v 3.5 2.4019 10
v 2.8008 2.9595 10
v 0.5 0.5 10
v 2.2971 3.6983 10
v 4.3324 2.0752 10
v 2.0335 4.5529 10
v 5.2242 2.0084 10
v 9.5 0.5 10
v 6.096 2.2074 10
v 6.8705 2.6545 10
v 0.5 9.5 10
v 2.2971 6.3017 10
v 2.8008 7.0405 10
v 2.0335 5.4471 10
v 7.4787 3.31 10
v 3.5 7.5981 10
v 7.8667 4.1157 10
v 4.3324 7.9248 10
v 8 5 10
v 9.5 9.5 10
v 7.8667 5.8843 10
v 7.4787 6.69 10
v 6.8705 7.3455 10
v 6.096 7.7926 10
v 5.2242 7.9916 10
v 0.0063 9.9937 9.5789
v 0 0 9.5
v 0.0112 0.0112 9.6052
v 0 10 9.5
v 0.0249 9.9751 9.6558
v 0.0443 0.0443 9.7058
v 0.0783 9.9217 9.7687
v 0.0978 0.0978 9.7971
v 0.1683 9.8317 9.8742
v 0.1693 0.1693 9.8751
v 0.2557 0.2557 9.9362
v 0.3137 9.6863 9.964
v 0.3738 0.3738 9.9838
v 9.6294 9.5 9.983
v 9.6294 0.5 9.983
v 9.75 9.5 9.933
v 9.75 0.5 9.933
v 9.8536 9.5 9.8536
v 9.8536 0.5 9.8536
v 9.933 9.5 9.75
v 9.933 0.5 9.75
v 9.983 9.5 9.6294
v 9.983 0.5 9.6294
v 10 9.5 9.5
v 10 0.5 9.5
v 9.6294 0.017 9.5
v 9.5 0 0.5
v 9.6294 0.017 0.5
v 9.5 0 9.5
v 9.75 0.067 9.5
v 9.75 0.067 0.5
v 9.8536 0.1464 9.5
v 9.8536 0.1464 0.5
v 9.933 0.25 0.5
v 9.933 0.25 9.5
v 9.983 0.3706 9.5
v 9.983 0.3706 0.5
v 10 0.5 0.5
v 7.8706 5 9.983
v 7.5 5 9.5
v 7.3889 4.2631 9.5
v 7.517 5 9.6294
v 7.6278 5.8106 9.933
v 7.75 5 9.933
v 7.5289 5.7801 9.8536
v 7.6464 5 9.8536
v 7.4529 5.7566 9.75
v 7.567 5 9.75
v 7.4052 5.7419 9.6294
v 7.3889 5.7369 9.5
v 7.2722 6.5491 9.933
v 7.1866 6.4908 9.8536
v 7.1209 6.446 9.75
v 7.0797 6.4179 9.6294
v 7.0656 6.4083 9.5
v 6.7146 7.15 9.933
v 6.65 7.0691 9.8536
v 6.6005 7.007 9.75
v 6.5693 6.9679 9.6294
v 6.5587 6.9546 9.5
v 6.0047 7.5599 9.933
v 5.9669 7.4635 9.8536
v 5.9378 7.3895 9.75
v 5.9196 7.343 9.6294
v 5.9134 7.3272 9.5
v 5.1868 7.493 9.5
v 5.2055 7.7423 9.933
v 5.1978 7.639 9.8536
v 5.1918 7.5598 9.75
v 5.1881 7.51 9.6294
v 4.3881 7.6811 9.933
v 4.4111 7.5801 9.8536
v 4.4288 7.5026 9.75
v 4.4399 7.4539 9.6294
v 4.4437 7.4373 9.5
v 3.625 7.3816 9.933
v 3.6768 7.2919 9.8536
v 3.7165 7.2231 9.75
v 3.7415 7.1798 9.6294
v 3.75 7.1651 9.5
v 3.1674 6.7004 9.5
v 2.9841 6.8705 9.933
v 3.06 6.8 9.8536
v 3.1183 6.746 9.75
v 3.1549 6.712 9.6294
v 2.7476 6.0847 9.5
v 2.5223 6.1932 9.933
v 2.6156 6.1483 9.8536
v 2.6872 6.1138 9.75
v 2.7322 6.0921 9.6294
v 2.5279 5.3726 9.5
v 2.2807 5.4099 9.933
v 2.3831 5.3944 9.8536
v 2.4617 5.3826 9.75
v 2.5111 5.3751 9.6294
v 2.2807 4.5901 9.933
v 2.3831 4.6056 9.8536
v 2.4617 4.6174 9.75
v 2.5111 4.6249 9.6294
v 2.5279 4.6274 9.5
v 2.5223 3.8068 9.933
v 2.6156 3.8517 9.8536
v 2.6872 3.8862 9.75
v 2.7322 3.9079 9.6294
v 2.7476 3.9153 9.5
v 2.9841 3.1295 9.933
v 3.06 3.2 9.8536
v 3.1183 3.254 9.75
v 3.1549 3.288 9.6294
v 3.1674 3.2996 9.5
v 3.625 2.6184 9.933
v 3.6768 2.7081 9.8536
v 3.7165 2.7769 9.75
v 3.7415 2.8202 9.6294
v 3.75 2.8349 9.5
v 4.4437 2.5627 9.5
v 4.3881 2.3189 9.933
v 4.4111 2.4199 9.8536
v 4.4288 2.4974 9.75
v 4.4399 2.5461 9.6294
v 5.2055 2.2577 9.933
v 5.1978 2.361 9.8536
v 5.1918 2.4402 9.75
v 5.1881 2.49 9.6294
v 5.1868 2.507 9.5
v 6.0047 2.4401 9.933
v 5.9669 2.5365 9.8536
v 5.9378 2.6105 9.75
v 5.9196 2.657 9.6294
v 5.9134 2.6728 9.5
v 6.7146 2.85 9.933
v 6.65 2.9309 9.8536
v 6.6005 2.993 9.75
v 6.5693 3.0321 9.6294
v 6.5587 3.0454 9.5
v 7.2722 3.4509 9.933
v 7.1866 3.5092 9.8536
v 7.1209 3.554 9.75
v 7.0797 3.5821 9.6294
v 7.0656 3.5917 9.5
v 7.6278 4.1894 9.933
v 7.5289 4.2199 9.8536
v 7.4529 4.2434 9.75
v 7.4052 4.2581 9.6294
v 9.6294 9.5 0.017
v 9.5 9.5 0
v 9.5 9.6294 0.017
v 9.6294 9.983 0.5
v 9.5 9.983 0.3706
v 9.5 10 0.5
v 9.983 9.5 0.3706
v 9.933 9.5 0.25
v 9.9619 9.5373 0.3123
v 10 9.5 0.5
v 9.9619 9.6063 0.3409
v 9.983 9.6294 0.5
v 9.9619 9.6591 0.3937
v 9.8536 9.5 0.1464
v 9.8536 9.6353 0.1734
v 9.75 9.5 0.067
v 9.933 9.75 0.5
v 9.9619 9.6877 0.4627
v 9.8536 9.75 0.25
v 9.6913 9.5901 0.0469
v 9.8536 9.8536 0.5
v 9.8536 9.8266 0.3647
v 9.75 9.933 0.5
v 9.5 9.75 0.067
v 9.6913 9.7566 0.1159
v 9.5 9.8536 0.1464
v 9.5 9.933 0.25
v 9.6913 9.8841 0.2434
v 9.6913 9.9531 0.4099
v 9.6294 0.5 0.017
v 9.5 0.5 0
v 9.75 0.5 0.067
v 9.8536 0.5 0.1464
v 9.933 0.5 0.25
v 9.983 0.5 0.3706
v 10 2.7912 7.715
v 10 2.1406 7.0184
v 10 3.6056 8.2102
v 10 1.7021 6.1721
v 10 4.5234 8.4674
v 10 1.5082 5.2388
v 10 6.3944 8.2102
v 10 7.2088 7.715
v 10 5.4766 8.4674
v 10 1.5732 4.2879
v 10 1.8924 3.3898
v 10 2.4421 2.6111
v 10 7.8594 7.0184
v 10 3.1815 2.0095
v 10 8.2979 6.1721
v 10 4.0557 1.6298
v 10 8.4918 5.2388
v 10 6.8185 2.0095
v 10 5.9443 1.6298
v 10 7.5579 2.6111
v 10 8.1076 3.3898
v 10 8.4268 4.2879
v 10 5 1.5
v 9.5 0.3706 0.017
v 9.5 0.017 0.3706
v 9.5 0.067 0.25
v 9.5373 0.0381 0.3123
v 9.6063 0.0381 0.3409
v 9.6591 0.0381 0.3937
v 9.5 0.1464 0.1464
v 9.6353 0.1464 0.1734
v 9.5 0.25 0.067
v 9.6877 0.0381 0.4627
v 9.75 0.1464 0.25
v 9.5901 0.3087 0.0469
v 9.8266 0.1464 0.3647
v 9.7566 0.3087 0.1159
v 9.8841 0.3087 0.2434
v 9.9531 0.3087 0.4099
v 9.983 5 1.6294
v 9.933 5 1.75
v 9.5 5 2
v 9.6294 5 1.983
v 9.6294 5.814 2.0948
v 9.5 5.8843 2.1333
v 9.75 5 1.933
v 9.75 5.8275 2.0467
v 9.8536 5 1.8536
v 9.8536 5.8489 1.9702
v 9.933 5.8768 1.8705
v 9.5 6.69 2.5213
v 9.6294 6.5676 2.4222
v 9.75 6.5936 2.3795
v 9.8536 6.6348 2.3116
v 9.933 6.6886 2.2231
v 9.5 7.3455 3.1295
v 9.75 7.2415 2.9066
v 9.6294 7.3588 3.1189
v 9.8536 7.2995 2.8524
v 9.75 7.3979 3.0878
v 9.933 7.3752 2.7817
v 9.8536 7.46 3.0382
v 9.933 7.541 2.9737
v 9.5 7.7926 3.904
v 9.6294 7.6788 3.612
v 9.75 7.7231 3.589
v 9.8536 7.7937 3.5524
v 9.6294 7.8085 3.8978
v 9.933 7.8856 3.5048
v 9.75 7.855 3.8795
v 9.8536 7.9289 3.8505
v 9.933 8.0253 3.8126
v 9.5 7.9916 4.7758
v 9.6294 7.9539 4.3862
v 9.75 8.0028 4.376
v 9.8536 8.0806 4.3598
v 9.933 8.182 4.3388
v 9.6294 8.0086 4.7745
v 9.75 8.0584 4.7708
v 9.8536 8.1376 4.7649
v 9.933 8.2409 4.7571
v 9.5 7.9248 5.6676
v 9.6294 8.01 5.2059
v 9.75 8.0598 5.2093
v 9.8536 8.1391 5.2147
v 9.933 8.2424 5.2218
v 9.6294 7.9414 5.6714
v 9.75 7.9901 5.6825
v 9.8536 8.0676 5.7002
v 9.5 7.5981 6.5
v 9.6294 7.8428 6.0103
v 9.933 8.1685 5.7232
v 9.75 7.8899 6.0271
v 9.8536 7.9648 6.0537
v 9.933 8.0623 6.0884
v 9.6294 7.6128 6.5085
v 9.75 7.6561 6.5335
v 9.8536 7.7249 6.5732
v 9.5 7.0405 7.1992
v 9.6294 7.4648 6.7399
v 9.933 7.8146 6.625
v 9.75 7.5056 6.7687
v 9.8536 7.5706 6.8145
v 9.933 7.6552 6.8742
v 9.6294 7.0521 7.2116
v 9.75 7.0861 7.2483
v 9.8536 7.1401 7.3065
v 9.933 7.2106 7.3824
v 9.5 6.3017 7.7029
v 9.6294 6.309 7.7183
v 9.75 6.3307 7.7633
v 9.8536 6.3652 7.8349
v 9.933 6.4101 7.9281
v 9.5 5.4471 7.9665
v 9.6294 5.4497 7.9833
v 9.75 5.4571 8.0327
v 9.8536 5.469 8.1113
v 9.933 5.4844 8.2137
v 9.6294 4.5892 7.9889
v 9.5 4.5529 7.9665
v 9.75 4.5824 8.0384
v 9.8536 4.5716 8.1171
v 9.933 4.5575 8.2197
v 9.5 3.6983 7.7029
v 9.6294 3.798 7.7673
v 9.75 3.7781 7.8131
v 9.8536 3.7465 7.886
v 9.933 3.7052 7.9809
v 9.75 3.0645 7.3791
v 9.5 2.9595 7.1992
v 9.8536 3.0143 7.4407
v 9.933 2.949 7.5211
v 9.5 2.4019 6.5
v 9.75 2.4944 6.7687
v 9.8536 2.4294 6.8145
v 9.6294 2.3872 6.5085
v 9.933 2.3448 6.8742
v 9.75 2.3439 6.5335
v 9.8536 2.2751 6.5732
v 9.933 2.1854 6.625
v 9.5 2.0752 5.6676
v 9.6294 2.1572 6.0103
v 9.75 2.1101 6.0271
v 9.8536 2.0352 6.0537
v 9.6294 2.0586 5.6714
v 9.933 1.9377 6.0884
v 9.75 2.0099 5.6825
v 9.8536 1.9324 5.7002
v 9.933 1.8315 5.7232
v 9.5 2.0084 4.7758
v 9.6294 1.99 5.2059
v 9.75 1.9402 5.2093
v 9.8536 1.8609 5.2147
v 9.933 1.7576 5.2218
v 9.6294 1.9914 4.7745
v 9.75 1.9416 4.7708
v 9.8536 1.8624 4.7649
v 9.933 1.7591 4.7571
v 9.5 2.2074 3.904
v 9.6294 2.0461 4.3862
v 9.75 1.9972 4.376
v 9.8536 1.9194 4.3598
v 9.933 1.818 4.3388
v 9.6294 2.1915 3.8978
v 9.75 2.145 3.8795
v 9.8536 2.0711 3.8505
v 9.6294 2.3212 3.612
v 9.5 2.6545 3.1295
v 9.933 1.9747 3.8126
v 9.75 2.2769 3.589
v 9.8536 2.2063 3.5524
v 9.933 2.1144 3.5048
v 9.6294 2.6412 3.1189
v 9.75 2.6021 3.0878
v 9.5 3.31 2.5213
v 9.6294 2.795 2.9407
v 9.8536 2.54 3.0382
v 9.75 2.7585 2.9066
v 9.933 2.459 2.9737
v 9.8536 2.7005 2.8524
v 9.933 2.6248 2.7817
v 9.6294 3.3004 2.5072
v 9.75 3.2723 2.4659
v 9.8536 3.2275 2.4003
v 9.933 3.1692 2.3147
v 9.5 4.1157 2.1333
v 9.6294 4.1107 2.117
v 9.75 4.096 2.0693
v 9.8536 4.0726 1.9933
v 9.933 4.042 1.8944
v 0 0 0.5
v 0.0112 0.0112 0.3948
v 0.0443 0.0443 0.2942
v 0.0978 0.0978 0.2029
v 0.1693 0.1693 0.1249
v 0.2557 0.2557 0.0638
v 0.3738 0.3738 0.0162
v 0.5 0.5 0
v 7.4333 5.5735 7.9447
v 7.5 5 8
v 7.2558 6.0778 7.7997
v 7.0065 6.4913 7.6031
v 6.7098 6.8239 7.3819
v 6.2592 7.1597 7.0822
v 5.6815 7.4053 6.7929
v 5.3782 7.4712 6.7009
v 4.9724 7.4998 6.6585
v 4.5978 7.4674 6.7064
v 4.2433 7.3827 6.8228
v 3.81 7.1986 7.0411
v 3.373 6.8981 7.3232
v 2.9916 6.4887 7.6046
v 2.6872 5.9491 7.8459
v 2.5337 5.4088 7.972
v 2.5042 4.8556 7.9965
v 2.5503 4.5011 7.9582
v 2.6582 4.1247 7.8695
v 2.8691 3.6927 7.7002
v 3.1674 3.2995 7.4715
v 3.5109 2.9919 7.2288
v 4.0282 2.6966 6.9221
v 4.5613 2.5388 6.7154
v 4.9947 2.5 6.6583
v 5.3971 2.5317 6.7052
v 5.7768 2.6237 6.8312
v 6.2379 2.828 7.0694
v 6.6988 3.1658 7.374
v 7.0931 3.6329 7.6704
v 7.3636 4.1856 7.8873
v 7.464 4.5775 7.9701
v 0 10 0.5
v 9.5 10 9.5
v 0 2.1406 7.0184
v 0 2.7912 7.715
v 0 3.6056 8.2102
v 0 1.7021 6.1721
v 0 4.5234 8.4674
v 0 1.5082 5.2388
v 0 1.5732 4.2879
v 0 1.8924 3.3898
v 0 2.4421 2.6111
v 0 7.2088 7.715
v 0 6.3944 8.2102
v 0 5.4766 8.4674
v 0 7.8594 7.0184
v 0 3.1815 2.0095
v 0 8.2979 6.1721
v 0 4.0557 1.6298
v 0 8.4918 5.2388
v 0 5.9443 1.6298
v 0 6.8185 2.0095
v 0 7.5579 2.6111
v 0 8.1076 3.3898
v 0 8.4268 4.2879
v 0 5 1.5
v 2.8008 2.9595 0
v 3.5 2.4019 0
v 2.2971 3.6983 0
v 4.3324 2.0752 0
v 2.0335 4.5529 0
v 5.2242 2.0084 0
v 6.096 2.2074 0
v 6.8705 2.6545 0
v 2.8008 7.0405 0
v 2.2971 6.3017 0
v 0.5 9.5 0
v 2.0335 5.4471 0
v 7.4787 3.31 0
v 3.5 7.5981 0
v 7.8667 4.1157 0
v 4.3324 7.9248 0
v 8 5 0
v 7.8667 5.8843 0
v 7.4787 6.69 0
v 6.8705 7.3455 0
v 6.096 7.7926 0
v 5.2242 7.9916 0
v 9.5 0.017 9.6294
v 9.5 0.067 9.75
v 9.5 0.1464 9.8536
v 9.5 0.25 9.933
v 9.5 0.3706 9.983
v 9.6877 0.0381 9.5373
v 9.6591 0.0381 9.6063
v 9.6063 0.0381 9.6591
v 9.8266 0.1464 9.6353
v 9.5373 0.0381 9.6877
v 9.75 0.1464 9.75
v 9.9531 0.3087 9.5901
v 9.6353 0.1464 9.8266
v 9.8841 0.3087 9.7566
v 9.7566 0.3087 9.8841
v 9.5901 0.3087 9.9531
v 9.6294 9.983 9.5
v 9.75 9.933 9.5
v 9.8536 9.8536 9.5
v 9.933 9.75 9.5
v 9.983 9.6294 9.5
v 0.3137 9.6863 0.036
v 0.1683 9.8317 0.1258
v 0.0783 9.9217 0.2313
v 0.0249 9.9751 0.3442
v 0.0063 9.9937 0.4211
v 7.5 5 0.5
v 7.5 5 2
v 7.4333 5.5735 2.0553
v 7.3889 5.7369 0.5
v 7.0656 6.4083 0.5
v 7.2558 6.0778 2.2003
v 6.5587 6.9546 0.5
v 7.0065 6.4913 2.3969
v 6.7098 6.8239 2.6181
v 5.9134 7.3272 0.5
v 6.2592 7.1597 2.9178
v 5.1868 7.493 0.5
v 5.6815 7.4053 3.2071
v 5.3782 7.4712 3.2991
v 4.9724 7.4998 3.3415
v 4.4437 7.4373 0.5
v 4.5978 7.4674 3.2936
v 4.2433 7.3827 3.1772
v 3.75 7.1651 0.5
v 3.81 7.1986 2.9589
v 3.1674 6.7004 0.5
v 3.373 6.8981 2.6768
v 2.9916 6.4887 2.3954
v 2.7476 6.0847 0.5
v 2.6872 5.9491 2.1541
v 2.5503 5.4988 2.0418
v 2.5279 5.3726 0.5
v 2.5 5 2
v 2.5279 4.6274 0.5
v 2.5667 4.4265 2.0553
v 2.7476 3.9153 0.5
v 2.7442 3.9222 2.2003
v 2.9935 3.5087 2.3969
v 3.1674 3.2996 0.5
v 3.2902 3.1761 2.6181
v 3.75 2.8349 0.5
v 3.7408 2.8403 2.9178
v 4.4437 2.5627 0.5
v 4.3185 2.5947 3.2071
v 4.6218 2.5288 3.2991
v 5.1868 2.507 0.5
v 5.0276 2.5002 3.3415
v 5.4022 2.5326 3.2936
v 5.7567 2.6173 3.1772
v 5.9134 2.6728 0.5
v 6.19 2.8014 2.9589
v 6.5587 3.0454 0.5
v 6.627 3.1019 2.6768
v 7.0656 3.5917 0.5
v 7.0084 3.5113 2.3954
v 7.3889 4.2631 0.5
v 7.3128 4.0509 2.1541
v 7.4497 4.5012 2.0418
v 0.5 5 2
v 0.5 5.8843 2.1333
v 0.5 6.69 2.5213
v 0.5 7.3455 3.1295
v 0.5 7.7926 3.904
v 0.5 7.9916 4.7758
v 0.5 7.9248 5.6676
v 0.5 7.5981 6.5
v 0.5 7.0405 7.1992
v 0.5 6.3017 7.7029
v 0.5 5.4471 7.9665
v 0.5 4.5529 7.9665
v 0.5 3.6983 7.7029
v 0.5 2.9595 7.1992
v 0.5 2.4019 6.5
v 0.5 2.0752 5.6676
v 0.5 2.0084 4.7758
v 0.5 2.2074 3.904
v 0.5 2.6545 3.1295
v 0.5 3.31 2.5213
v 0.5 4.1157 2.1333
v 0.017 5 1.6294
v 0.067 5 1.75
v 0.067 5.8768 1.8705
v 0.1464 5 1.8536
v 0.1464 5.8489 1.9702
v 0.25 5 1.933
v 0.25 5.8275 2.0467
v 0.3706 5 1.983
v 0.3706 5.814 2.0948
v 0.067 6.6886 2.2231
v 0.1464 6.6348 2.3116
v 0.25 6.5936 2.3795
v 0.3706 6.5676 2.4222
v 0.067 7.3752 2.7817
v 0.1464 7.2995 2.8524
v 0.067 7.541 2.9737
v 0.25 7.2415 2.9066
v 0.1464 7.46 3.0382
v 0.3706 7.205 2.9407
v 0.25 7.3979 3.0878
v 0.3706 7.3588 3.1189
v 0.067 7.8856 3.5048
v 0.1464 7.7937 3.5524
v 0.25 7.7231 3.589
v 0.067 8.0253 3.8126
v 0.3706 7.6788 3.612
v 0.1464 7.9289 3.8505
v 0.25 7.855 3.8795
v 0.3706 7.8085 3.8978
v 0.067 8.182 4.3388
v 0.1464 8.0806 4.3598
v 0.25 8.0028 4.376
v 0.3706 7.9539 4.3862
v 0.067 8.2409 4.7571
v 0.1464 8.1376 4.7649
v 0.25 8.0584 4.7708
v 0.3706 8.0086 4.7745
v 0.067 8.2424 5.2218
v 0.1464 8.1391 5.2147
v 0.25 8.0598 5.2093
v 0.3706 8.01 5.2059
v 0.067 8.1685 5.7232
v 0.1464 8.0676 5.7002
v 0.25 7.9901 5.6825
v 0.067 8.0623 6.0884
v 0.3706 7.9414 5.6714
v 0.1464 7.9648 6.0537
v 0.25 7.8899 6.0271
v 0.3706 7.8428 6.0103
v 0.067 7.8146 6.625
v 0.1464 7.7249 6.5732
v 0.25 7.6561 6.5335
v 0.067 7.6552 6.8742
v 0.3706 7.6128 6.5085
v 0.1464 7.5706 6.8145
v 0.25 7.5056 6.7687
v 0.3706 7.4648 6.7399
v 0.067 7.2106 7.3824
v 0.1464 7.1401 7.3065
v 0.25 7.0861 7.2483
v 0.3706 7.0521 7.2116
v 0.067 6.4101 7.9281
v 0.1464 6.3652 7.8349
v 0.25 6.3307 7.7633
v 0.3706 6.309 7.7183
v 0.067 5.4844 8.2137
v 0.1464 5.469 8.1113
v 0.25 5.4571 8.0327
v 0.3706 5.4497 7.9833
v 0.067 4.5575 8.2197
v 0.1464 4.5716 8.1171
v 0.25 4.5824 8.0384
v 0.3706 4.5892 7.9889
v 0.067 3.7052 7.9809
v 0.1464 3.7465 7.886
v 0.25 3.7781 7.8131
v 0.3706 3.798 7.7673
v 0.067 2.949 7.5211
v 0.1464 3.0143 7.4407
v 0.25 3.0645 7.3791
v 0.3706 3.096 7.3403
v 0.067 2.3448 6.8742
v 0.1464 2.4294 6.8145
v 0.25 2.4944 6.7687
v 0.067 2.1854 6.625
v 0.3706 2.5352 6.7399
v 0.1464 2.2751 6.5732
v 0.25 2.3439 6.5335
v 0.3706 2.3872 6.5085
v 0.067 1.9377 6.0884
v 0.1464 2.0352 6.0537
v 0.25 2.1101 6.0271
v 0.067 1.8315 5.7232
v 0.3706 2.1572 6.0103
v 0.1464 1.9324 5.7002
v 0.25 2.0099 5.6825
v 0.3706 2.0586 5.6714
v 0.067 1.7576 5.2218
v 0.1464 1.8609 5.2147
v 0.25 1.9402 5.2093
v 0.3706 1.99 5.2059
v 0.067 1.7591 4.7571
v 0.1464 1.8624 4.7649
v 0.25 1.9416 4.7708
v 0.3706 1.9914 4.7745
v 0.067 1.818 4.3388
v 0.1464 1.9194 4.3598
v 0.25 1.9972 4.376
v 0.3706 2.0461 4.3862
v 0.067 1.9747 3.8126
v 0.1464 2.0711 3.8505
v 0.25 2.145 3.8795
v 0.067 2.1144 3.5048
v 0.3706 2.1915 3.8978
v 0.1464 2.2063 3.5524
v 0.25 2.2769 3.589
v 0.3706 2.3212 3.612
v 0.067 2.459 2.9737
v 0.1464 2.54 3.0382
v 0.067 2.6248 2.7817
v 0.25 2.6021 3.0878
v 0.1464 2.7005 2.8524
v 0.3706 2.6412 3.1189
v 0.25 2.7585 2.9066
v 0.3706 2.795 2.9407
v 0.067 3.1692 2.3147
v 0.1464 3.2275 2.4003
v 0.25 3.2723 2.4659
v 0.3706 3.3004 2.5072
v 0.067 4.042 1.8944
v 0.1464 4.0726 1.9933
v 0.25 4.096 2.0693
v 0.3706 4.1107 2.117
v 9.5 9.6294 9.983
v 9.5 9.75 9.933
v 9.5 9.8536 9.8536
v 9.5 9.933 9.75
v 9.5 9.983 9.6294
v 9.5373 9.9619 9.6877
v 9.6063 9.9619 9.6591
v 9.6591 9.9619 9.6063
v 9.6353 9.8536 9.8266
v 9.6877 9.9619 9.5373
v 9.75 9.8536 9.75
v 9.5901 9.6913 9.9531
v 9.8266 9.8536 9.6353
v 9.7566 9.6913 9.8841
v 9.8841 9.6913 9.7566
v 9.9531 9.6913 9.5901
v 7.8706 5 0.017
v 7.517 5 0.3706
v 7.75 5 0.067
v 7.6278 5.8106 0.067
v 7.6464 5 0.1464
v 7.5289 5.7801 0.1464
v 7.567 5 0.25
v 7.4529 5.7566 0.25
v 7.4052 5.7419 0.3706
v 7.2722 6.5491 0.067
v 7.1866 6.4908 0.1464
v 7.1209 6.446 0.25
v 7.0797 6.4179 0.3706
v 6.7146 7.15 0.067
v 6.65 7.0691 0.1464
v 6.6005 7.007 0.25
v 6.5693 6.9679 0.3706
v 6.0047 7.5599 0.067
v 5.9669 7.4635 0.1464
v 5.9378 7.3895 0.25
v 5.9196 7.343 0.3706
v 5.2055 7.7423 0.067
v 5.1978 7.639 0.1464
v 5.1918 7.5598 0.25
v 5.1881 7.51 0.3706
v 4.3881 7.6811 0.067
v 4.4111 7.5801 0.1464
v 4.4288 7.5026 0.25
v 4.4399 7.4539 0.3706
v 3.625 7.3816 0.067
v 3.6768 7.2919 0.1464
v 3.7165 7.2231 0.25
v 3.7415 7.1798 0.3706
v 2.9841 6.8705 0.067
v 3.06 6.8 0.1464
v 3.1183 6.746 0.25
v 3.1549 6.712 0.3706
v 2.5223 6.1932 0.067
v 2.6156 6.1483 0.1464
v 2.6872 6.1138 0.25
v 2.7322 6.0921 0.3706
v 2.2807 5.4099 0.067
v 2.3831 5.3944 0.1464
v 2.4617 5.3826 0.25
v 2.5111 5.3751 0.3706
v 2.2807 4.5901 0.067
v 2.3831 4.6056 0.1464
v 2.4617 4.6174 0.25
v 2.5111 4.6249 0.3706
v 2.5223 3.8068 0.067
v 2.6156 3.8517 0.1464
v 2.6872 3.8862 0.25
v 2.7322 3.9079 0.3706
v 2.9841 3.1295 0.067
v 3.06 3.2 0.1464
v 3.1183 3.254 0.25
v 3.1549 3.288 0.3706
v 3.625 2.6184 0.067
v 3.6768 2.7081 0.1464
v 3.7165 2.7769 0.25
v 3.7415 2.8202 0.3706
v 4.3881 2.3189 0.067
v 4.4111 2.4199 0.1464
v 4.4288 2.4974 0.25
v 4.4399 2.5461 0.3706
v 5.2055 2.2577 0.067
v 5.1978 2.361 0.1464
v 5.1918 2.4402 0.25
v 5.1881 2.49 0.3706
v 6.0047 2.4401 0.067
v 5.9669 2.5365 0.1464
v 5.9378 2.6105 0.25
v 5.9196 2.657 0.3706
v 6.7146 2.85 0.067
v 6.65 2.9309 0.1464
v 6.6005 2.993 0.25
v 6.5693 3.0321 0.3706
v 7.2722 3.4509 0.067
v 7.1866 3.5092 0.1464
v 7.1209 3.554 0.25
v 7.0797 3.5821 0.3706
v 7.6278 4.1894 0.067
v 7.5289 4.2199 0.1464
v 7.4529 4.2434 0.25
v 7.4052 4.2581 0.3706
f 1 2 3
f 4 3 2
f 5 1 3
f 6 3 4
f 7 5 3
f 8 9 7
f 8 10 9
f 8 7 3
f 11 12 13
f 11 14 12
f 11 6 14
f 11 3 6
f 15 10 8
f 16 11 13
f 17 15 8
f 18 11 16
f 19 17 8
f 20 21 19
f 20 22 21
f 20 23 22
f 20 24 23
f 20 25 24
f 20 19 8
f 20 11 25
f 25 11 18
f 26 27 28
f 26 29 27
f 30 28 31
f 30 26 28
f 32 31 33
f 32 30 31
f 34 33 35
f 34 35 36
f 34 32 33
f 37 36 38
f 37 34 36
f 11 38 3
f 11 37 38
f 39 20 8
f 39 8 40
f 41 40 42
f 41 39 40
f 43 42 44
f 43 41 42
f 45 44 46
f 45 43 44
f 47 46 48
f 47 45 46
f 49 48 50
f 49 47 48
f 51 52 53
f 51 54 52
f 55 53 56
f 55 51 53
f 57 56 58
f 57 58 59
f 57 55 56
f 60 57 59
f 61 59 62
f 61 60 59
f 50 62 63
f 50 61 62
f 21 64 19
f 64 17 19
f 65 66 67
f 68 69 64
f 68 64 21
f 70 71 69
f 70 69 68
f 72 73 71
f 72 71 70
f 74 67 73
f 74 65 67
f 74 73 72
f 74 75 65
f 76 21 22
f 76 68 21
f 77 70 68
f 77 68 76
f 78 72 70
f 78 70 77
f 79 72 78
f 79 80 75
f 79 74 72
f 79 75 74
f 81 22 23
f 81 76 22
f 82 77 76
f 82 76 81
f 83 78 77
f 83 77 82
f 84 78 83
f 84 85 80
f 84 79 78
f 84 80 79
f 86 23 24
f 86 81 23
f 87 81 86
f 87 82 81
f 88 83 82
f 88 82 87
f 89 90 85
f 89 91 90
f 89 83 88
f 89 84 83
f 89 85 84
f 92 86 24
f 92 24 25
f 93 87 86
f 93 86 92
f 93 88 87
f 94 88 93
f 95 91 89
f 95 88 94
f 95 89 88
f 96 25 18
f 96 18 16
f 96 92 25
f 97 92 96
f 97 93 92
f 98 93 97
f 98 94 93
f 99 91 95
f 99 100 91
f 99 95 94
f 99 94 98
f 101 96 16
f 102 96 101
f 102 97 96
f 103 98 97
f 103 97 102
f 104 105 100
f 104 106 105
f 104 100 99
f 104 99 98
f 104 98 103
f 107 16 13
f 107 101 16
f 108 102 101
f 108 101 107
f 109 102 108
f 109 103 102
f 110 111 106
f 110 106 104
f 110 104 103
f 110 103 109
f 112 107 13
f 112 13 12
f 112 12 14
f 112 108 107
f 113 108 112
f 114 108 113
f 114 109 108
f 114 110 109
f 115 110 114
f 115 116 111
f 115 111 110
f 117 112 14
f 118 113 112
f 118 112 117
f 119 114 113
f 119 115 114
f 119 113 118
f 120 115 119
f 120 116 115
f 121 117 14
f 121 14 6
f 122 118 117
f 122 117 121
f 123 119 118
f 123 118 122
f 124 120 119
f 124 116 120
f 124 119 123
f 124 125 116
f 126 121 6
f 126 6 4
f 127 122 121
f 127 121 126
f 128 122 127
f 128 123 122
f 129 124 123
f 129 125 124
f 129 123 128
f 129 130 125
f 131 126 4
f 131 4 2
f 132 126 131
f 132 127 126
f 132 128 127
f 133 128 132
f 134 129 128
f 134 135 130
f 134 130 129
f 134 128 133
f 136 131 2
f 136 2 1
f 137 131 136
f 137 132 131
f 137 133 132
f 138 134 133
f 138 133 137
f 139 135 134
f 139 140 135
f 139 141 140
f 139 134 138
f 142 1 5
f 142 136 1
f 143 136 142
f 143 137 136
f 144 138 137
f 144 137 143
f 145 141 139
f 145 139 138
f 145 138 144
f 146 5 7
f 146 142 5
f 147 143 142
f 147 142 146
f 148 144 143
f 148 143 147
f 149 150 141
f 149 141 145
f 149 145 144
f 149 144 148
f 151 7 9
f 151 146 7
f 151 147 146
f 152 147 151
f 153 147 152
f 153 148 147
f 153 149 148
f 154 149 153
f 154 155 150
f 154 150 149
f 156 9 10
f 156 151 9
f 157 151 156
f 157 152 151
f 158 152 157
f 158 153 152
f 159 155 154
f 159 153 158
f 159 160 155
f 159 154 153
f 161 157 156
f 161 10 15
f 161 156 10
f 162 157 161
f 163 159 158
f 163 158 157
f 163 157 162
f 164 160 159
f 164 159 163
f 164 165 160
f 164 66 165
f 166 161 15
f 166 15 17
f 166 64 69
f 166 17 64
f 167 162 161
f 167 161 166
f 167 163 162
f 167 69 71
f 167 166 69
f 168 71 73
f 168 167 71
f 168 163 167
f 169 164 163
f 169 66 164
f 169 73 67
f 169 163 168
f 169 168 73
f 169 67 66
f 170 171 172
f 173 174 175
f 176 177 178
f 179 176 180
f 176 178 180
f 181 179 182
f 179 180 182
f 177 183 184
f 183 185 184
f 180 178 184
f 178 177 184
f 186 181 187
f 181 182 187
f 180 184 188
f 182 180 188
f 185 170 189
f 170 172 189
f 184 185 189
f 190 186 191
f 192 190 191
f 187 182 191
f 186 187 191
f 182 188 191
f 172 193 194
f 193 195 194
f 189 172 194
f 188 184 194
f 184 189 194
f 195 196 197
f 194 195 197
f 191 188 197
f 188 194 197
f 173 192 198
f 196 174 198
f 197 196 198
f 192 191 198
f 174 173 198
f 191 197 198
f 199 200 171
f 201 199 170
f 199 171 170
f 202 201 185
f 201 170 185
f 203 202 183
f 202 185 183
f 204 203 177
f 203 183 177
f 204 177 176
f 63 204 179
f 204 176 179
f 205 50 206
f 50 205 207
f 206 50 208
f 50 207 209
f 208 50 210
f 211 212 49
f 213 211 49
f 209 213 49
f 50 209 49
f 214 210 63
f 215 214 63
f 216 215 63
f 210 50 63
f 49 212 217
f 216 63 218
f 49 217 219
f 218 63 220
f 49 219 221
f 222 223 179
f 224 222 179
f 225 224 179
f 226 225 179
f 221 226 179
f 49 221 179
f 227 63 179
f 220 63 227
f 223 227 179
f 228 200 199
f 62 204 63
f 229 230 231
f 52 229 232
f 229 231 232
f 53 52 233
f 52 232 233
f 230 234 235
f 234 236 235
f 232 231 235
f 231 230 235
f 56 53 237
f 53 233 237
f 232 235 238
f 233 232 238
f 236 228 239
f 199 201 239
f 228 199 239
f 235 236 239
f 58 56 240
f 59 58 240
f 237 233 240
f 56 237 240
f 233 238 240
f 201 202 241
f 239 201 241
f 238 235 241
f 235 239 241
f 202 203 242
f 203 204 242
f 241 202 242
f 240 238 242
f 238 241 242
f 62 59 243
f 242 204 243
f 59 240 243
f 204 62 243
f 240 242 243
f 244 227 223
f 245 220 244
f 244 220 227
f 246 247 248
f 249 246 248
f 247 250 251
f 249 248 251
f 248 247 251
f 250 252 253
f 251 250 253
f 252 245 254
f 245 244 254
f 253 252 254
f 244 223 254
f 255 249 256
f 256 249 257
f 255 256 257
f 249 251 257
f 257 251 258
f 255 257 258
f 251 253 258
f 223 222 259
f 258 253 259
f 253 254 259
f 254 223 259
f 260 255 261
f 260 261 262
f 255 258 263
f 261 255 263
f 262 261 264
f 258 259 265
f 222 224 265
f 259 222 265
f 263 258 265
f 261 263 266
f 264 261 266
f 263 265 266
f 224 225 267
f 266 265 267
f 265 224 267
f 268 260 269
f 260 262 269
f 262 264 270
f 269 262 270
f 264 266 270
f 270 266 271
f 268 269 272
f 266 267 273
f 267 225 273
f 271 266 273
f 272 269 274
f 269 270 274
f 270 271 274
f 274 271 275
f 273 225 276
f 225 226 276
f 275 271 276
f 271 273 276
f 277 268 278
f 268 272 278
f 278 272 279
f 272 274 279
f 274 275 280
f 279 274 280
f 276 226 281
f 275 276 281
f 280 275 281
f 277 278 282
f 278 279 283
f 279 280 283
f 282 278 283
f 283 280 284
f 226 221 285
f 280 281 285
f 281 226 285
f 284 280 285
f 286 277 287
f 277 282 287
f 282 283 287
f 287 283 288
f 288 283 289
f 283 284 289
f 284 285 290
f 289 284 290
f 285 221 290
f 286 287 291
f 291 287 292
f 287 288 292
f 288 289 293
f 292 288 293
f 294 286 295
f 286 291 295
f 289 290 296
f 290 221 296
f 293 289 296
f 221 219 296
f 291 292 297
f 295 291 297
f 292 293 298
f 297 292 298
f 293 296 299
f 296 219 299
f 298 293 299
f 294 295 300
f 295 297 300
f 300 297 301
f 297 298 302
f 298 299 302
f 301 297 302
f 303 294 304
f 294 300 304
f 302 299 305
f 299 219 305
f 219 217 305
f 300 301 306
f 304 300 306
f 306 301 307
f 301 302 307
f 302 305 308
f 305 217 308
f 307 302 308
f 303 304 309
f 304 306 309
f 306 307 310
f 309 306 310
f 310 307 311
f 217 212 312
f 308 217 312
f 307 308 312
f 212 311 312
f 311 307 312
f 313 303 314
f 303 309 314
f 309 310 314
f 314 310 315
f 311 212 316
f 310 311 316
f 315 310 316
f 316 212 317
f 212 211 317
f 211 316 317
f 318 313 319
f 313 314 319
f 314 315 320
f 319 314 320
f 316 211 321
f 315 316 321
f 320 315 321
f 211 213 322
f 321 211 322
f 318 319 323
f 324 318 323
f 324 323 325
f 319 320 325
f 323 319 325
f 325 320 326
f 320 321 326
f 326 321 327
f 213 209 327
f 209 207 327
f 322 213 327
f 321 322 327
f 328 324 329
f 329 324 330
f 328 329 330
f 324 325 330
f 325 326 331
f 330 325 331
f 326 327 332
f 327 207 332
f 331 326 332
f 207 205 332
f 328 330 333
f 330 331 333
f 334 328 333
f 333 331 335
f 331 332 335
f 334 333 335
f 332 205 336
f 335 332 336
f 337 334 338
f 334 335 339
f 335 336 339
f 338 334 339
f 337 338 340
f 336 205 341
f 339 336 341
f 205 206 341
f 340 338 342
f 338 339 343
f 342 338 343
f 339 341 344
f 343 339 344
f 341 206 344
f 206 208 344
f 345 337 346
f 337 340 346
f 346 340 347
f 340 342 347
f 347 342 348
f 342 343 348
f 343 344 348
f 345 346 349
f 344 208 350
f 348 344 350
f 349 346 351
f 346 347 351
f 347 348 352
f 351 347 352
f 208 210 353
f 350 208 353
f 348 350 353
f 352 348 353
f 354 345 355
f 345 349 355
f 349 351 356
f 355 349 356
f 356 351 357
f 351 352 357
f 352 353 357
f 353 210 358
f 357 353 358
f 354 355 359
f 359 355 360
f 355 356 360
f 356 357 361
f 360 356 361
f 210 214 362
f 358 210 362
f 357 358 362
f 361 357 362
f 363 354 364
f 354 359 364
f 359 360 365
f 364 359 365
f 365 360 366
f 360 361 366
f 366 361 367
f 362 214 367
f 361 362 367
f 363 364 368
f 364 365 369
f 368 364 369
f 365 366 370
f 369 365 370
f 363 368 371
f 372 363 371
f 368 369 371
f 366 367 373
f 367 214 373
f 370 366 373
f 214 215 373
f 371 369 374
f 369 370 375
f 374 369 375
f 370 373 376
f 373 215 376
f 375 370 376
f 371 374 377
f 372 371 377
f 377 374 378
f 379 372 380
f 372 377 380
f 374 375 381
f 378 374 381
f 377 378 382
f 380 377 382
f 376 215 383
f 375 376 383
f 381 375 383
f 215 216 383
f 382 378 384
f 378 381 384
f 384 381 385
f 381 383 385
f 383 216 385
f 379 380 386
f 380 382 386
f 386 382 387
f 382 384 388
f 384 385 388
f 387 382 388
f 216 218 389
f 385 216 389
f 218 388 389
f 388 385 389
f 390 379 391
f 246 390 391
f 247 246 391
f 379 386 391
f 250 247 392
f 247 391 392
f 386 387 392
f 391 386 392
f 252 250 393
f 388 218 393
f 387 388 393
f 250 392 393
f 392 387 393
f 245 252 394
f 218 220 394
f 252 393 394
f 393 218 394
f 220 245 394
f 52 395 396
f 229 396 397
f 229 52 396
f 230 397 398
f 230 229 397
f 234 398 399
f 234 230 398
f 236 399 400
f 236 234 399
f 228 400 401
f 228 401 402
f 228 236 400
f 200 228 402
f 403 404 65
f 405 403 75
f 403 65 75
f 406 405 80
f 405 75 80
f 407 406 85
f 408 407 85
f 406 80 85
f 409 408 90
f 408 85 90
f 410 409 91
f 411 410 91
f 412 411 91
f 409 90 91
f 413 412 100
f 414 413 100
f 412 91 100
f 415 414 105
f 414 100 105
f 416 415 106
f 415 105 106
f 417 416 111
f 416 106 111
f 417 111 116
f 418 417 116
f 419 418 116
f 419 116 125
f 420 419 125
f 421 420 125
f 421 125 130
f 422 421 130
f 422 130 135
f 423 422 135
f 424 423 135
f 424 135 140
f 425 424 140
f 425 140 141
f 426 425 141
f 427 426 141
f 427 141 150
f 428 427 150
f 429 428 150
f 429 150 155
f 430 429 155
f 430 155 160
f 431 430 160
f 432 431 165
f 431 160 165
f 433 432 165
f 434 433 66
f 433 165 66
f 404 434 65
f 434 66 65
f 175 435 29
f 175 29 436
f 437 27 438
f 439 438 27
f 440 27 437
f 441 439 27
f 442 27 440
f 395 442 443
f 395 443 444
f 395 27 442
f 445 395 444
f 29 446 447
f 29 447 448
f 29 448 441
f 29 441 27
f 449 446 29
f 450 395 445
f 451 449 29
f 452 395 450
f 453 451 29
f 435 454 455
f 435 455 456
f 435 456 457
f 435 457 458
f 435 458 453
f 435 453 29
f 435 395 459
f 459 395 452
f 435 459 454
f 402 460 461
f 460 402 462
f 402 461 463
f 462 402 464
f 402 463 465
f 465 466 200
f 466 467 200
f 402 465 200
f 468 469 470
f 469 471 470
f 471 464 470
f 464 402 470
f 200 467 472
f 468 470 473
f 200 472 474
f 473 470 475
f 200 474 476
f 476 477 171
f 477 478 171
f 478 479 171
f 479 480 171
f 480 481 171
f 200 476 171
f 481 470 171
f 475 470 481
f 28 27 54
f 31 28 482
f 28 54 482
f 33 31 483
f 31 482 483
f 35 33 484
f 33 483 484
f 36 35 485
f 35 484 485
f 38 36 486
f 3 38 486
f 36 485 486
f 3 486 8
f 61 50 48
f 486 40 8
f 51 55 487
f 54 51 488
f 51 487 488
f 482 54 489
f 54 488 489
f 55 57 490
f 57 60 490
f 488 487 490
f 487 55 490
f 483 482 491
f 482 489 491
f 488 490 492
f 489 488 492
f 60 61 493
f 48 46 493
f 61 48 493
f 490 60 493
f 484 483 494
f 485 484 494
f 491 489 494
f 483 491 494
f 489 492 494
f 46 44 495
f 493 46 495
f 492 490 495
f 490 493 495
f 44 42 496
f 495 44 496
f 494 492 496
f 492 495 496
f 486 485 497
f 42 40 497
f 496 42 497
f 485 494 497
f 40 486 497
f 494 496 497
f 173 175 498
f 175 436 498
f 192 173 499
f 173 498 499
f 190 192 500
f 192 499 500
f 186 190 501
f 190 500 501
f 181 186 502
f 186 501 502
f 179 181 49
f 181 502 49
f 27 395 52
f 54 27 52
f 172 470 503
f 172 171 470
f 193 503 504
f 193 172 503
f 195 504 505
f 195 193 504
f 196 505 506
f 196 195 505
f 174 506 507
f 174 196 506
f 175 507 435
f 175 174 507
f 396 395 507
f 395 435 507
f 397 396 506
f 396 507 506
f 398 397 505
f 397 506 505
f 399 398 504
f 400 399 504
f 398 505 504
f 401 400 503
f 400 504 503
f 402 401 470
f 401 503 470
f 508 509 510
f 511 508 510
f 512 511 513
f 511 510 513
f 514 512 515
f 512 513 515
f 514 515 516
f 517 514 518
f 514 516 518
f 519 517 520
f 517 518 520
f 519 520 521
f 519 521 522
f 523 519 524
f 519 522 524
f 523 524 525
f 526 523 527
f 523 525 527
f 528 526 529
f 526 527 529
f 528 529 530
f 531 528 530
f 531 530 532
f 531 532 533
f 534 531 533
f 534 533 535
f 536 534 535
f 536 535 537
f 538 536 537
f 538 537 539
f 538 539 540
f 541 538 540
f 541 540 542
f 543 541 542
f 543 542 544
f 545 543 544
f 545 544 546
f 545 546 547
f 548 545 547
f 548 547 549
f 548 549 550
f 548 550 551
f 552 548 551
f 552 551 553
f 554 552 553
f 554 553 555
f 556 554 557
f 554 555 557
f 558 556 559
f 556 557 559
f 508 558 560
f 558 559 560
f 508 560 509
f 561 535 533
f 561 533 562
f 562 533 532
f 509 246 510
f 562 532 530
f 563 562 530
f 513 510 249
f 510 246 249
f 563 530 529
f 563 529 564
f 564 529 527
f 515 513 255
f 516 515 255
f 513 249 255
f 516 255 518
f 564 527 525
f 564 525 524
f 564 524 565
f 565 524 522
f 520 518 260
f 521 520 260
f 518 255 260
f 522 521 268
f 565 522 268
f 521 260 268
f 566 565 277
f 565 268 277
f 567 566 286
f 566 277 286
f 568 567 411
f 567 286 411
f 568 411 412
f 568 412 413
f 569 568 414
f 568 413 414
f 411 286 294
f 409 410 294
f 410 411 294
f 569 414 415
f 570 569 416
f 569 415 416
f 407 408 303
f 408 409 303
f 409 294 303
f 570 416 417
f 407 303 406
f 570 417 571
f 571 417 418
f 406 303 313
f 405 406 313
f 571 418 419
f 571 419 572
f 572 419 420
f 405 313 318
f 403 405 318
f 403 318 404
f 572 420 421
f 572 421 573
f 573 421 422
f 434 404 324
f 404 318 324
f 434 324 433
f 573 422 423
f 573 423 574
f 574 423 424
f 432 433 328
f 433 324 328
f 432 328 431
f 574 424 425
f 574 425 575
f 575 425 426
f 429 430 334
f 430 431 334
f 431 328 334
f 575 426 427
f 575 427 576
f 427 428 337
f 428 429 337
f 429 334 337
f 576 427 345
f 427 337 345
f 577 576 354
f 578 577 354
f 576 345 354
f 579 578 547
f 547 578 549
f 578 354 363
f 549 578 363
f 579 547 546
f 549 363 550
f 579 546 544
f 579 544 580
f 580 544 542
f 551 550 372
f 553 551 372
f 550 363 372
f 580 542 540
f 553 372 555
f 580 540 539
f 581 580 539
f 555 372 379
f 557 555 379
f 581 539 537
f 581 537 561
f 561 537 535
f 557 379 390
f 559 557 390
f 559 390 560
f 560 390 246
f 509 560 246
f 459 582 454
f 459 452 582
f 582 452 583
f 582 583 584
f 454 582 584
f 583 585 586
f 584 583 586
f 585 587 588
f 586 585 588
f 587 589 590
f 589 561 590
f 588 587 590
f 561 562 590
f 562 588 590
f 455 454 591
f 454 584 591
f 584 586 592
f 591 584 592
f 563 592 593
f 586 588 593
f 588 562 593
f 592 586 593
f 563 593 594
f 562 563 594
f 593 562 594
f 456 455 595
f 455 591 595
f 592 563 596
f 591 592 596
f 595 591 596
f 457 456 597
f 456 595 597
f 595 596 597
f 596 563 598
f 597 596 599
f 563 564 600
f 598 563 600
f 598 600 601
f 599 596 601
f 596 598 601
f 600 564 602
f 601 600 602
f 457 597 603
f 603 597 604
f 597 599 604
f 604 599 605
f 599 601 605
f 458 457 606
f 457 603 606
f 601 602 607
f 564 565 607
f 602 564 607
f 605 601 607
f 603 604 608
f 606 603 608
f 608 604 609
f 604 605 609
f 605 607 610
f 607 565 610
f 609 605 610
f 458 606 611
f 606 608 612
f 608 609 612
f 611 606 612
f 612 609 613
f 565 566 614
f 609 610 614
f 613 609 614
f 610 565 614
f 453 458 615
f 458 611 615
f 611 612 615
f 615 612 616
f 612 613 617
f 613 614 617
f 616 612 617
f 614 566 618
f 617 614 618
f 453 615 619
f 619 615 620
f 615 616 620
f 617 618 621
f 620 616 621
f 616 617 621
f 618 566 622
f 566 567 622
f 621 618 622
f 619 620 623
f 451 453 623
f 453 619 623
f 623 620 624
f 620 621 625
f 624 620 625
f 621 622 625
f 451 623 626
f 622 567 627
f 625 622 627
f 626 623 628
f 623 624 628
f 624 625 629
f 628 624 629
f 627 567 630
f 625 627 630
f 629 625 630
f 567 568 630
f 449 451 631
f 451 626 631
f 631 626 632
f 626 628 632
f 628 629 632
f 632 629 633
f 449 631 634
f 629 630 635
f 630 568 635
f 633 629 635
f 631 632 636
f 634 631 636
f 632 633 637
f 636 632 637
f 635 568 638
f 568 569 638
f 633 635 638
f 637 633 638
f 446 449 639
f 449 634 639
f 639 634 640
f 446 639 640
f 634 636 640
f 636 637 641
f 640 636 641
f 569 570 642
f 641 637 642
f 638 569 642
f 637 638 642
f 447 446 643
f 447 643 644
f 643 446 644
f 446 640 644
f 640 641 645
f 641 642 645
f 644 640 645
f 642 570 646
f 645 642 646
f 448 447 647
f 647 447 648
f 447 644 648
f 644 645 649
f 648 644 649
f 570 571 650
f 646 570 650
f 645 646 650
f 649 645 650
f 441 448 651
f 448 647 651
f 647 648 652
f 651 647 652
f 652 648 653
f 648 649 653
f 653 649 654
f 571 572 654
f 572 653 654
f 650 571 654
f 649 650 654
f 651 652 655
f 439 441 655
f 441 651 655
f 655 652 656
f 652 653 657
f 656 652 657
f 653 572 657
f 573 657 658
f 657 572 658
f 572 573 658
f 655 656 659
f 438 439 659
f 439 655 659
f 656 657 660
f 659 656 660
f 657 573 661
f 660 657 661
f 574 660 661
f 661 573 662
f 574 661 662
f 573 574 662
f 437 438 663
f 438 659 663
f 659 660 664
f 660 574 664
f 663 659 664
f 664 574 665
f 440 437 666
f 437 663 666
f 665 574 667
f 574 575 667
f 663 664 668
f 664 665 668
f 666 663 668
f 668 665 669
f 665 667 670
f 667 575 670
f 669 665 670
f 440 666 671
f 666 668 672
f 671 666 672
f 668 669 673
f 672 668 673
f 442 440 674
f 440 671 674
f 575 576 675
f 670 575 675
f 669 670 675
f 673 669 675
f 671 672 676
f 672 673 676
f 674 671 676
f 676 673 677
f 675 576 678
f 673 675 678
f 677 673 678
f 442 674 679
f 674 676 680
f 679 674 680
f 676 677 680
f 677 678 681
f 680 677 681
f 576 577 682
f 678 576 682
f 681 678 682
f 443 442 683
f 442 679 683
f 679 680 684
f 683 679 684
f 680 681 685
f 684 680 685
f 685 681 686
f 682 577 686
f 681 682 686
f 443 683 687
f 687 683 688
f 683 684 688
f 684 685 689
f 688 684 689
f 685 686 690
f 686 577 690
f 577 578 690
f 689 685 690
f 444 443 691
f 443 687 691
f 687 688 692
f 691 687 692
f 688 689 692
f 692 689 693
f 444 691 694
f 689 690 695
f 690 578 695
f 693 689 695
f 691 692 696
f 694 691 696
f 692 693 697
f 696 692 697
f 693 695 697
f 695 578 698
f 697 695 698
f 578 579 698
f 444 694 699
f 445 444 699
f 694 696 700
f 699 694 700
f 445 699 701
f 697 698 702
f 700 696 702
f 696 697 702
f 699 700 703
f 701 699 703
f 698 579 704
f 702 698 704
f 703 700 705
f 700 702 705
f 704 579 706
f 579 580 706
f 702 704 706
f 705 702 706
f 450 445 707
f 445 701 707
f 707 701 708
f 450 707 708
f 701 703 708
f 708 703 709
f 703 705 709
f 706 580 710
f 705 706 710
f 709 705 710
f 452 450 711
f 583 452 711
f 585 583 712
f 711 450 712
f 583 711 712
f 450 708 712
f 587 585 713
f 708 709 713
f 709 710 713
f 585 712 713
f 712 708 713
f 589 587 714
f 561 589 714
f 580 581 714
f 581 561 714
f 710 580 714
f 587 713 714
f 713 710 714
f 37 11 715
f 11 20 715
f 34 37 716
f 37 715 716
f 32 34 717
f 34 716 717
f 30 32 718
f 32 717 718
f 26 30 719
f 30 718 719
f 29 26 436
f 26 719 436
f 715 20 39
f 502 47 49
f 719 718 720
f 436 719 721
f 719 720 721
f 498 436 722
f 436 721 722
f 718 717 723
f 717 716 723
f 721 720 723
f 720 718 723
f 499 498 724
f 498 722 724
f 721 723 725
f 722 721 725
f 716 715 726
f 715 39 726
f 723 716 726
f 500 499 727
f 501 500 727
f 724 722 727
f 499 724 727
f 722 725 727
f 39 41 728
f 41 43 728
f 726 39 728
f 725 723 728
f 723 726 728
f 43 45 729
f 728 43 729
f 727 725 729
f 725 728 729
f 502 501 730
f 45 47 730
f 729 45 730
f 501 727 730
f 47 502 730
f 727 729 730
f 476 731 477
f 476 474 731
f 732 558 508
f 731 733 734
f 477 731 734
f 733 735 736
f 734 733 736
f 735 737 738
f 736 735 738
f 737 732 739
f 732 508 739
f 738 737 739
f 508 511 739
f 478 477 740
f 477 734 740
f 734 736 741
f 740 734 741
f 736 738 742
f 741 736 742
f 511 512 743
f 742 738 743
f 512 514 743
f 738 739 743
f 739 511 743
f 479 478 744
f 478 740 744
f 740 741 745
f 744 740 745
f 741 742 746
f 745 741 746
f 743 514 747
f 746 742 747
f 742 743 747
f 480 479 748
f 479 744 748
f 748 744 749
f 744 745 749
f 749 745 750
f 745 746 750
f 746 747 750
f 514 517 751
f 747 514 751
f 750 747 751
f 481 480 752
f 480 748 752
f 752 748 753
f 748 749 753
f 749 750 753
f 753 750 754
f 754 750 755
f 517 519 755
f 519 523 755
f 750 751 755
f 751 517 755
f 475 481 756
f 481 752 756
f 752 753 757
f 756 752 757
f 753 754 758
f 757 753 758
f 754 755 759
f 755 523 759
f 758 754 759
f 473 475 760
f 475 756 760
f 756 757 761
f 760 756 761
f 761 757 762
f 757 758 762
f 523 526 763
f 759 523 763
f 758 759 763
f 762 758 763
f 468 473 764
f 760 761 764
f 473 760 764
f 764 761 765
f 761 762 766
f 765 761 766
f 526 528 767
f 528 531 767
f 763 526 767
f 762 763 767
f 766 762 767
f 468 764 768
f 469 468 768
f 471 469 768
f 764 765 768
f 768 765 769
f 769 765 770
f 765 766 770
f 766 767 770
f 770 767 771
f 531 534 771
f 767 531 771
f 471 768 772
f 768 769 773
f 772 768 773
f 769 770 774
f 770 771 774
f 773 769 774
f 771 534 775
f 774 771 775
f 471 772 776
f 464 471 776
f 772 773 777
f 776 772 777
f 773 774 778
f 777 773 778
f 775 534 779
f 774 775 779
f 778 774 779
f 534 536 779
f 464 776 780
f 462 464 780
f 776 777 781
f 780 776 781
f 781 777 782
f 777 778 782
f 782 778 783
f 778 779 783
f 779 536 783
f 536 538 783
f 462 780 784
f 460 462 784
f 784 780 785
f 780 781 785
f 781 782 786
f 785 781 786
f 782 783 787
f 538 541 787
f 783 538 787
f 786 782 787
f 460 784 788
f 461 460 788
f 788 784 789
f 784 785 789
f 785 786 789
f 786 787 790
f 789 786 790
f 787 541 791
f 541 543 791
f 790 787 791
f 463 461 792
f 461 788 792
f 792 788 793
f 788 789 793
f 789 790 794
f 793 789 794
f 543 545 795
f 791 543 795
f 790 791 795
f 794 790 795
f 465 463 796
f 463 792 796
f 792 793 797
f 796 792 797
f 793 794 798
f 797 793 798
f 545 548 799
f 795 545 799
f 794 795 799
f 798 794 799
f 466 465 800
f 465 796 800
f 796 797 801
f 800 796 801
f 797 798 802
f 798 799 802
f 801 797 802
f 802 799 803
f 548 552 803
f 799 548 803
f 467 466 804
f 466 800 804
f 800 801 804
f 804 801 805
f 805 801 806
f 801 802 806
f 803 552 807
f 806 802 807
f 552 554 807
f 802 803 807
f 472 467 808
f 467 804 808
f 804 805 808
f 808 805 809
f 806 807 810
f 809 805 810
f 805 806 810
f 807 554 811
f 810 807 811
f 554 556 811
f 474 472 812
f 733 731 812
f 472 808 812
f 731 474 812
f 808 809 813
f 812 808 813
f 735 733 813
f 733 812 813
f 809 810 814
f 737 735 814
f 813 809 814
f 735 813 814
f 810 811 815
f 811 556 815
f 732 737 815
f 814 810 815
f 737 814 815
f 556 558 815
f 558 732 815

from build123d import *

# Parameters (mm, degrees)
SKETCH_1_W          = 10
SKETCH_1_H          = 10
EXTRUDE_1_DEPTH     = 10
SKETCH_4_R          = 3
CUT_EXTRUDE_2_DEPTH = 11
SKETCH_5_R          = 2.5
CUT_EXTRUDE_3_DEPTH = 11
FILLET_1_R          = 0.5


with BuildPart() as part:
    # 草图1 → 凸台-拉伸1 (new body)
    with BuildSketch(Plane.XY):
        with Locations((5, 5)):
            Rectangle(SKETCH_1_W, SKETCH_1_H)
    extrude(amount=EXTRUDE_1_DEPTH)

    # 草图4 → 切除-拉伸2 (cut, through all)
    with BuildSketch(Plane(origin=(10, 0, 0), x_dir=(0, 0, -1), z_dir=(1, 0, 0))):
        with Locations((-5, 5)):
            Circle(SKETCH_4_R)
    extrude(amount=-CUT_EXTRUDE_2_DEPTH, mode=Mode.SUBTRACT)

    # 草图5 → 切除-拉伸3 (cut, through all)
    with BuildSketch(Plane.XY.offset(10)):
        with Locations((5, 5)):
            Circle(SKETCH_5_R)
    extrude(amount=-CUT_EXTRUDE_3_DEPTH, mode=Mode.SUBTRACT)

    # 圆角1
    fillet_1_edges = [part.edges().sort_by_distance(p)[0] for p in [
        (10, 5, 10),
        (0, 5, 8),
        (10, 5, 8),
        (5, 10, 10),
        (2.5, 5, 0),
        (2.5, 5, 10),
        (0, 5, 10),
        (5, 10, 0),
        (10, 5, 0),
        (5, 0, 0),
        (0, 5, 0),
        (10, 10, 5),
        (10, 0, 5),
        (5, 0, 10),
    ]]
    fillet(fillet_1_edges, radius=FILLET_1_R)


solid = part.part
